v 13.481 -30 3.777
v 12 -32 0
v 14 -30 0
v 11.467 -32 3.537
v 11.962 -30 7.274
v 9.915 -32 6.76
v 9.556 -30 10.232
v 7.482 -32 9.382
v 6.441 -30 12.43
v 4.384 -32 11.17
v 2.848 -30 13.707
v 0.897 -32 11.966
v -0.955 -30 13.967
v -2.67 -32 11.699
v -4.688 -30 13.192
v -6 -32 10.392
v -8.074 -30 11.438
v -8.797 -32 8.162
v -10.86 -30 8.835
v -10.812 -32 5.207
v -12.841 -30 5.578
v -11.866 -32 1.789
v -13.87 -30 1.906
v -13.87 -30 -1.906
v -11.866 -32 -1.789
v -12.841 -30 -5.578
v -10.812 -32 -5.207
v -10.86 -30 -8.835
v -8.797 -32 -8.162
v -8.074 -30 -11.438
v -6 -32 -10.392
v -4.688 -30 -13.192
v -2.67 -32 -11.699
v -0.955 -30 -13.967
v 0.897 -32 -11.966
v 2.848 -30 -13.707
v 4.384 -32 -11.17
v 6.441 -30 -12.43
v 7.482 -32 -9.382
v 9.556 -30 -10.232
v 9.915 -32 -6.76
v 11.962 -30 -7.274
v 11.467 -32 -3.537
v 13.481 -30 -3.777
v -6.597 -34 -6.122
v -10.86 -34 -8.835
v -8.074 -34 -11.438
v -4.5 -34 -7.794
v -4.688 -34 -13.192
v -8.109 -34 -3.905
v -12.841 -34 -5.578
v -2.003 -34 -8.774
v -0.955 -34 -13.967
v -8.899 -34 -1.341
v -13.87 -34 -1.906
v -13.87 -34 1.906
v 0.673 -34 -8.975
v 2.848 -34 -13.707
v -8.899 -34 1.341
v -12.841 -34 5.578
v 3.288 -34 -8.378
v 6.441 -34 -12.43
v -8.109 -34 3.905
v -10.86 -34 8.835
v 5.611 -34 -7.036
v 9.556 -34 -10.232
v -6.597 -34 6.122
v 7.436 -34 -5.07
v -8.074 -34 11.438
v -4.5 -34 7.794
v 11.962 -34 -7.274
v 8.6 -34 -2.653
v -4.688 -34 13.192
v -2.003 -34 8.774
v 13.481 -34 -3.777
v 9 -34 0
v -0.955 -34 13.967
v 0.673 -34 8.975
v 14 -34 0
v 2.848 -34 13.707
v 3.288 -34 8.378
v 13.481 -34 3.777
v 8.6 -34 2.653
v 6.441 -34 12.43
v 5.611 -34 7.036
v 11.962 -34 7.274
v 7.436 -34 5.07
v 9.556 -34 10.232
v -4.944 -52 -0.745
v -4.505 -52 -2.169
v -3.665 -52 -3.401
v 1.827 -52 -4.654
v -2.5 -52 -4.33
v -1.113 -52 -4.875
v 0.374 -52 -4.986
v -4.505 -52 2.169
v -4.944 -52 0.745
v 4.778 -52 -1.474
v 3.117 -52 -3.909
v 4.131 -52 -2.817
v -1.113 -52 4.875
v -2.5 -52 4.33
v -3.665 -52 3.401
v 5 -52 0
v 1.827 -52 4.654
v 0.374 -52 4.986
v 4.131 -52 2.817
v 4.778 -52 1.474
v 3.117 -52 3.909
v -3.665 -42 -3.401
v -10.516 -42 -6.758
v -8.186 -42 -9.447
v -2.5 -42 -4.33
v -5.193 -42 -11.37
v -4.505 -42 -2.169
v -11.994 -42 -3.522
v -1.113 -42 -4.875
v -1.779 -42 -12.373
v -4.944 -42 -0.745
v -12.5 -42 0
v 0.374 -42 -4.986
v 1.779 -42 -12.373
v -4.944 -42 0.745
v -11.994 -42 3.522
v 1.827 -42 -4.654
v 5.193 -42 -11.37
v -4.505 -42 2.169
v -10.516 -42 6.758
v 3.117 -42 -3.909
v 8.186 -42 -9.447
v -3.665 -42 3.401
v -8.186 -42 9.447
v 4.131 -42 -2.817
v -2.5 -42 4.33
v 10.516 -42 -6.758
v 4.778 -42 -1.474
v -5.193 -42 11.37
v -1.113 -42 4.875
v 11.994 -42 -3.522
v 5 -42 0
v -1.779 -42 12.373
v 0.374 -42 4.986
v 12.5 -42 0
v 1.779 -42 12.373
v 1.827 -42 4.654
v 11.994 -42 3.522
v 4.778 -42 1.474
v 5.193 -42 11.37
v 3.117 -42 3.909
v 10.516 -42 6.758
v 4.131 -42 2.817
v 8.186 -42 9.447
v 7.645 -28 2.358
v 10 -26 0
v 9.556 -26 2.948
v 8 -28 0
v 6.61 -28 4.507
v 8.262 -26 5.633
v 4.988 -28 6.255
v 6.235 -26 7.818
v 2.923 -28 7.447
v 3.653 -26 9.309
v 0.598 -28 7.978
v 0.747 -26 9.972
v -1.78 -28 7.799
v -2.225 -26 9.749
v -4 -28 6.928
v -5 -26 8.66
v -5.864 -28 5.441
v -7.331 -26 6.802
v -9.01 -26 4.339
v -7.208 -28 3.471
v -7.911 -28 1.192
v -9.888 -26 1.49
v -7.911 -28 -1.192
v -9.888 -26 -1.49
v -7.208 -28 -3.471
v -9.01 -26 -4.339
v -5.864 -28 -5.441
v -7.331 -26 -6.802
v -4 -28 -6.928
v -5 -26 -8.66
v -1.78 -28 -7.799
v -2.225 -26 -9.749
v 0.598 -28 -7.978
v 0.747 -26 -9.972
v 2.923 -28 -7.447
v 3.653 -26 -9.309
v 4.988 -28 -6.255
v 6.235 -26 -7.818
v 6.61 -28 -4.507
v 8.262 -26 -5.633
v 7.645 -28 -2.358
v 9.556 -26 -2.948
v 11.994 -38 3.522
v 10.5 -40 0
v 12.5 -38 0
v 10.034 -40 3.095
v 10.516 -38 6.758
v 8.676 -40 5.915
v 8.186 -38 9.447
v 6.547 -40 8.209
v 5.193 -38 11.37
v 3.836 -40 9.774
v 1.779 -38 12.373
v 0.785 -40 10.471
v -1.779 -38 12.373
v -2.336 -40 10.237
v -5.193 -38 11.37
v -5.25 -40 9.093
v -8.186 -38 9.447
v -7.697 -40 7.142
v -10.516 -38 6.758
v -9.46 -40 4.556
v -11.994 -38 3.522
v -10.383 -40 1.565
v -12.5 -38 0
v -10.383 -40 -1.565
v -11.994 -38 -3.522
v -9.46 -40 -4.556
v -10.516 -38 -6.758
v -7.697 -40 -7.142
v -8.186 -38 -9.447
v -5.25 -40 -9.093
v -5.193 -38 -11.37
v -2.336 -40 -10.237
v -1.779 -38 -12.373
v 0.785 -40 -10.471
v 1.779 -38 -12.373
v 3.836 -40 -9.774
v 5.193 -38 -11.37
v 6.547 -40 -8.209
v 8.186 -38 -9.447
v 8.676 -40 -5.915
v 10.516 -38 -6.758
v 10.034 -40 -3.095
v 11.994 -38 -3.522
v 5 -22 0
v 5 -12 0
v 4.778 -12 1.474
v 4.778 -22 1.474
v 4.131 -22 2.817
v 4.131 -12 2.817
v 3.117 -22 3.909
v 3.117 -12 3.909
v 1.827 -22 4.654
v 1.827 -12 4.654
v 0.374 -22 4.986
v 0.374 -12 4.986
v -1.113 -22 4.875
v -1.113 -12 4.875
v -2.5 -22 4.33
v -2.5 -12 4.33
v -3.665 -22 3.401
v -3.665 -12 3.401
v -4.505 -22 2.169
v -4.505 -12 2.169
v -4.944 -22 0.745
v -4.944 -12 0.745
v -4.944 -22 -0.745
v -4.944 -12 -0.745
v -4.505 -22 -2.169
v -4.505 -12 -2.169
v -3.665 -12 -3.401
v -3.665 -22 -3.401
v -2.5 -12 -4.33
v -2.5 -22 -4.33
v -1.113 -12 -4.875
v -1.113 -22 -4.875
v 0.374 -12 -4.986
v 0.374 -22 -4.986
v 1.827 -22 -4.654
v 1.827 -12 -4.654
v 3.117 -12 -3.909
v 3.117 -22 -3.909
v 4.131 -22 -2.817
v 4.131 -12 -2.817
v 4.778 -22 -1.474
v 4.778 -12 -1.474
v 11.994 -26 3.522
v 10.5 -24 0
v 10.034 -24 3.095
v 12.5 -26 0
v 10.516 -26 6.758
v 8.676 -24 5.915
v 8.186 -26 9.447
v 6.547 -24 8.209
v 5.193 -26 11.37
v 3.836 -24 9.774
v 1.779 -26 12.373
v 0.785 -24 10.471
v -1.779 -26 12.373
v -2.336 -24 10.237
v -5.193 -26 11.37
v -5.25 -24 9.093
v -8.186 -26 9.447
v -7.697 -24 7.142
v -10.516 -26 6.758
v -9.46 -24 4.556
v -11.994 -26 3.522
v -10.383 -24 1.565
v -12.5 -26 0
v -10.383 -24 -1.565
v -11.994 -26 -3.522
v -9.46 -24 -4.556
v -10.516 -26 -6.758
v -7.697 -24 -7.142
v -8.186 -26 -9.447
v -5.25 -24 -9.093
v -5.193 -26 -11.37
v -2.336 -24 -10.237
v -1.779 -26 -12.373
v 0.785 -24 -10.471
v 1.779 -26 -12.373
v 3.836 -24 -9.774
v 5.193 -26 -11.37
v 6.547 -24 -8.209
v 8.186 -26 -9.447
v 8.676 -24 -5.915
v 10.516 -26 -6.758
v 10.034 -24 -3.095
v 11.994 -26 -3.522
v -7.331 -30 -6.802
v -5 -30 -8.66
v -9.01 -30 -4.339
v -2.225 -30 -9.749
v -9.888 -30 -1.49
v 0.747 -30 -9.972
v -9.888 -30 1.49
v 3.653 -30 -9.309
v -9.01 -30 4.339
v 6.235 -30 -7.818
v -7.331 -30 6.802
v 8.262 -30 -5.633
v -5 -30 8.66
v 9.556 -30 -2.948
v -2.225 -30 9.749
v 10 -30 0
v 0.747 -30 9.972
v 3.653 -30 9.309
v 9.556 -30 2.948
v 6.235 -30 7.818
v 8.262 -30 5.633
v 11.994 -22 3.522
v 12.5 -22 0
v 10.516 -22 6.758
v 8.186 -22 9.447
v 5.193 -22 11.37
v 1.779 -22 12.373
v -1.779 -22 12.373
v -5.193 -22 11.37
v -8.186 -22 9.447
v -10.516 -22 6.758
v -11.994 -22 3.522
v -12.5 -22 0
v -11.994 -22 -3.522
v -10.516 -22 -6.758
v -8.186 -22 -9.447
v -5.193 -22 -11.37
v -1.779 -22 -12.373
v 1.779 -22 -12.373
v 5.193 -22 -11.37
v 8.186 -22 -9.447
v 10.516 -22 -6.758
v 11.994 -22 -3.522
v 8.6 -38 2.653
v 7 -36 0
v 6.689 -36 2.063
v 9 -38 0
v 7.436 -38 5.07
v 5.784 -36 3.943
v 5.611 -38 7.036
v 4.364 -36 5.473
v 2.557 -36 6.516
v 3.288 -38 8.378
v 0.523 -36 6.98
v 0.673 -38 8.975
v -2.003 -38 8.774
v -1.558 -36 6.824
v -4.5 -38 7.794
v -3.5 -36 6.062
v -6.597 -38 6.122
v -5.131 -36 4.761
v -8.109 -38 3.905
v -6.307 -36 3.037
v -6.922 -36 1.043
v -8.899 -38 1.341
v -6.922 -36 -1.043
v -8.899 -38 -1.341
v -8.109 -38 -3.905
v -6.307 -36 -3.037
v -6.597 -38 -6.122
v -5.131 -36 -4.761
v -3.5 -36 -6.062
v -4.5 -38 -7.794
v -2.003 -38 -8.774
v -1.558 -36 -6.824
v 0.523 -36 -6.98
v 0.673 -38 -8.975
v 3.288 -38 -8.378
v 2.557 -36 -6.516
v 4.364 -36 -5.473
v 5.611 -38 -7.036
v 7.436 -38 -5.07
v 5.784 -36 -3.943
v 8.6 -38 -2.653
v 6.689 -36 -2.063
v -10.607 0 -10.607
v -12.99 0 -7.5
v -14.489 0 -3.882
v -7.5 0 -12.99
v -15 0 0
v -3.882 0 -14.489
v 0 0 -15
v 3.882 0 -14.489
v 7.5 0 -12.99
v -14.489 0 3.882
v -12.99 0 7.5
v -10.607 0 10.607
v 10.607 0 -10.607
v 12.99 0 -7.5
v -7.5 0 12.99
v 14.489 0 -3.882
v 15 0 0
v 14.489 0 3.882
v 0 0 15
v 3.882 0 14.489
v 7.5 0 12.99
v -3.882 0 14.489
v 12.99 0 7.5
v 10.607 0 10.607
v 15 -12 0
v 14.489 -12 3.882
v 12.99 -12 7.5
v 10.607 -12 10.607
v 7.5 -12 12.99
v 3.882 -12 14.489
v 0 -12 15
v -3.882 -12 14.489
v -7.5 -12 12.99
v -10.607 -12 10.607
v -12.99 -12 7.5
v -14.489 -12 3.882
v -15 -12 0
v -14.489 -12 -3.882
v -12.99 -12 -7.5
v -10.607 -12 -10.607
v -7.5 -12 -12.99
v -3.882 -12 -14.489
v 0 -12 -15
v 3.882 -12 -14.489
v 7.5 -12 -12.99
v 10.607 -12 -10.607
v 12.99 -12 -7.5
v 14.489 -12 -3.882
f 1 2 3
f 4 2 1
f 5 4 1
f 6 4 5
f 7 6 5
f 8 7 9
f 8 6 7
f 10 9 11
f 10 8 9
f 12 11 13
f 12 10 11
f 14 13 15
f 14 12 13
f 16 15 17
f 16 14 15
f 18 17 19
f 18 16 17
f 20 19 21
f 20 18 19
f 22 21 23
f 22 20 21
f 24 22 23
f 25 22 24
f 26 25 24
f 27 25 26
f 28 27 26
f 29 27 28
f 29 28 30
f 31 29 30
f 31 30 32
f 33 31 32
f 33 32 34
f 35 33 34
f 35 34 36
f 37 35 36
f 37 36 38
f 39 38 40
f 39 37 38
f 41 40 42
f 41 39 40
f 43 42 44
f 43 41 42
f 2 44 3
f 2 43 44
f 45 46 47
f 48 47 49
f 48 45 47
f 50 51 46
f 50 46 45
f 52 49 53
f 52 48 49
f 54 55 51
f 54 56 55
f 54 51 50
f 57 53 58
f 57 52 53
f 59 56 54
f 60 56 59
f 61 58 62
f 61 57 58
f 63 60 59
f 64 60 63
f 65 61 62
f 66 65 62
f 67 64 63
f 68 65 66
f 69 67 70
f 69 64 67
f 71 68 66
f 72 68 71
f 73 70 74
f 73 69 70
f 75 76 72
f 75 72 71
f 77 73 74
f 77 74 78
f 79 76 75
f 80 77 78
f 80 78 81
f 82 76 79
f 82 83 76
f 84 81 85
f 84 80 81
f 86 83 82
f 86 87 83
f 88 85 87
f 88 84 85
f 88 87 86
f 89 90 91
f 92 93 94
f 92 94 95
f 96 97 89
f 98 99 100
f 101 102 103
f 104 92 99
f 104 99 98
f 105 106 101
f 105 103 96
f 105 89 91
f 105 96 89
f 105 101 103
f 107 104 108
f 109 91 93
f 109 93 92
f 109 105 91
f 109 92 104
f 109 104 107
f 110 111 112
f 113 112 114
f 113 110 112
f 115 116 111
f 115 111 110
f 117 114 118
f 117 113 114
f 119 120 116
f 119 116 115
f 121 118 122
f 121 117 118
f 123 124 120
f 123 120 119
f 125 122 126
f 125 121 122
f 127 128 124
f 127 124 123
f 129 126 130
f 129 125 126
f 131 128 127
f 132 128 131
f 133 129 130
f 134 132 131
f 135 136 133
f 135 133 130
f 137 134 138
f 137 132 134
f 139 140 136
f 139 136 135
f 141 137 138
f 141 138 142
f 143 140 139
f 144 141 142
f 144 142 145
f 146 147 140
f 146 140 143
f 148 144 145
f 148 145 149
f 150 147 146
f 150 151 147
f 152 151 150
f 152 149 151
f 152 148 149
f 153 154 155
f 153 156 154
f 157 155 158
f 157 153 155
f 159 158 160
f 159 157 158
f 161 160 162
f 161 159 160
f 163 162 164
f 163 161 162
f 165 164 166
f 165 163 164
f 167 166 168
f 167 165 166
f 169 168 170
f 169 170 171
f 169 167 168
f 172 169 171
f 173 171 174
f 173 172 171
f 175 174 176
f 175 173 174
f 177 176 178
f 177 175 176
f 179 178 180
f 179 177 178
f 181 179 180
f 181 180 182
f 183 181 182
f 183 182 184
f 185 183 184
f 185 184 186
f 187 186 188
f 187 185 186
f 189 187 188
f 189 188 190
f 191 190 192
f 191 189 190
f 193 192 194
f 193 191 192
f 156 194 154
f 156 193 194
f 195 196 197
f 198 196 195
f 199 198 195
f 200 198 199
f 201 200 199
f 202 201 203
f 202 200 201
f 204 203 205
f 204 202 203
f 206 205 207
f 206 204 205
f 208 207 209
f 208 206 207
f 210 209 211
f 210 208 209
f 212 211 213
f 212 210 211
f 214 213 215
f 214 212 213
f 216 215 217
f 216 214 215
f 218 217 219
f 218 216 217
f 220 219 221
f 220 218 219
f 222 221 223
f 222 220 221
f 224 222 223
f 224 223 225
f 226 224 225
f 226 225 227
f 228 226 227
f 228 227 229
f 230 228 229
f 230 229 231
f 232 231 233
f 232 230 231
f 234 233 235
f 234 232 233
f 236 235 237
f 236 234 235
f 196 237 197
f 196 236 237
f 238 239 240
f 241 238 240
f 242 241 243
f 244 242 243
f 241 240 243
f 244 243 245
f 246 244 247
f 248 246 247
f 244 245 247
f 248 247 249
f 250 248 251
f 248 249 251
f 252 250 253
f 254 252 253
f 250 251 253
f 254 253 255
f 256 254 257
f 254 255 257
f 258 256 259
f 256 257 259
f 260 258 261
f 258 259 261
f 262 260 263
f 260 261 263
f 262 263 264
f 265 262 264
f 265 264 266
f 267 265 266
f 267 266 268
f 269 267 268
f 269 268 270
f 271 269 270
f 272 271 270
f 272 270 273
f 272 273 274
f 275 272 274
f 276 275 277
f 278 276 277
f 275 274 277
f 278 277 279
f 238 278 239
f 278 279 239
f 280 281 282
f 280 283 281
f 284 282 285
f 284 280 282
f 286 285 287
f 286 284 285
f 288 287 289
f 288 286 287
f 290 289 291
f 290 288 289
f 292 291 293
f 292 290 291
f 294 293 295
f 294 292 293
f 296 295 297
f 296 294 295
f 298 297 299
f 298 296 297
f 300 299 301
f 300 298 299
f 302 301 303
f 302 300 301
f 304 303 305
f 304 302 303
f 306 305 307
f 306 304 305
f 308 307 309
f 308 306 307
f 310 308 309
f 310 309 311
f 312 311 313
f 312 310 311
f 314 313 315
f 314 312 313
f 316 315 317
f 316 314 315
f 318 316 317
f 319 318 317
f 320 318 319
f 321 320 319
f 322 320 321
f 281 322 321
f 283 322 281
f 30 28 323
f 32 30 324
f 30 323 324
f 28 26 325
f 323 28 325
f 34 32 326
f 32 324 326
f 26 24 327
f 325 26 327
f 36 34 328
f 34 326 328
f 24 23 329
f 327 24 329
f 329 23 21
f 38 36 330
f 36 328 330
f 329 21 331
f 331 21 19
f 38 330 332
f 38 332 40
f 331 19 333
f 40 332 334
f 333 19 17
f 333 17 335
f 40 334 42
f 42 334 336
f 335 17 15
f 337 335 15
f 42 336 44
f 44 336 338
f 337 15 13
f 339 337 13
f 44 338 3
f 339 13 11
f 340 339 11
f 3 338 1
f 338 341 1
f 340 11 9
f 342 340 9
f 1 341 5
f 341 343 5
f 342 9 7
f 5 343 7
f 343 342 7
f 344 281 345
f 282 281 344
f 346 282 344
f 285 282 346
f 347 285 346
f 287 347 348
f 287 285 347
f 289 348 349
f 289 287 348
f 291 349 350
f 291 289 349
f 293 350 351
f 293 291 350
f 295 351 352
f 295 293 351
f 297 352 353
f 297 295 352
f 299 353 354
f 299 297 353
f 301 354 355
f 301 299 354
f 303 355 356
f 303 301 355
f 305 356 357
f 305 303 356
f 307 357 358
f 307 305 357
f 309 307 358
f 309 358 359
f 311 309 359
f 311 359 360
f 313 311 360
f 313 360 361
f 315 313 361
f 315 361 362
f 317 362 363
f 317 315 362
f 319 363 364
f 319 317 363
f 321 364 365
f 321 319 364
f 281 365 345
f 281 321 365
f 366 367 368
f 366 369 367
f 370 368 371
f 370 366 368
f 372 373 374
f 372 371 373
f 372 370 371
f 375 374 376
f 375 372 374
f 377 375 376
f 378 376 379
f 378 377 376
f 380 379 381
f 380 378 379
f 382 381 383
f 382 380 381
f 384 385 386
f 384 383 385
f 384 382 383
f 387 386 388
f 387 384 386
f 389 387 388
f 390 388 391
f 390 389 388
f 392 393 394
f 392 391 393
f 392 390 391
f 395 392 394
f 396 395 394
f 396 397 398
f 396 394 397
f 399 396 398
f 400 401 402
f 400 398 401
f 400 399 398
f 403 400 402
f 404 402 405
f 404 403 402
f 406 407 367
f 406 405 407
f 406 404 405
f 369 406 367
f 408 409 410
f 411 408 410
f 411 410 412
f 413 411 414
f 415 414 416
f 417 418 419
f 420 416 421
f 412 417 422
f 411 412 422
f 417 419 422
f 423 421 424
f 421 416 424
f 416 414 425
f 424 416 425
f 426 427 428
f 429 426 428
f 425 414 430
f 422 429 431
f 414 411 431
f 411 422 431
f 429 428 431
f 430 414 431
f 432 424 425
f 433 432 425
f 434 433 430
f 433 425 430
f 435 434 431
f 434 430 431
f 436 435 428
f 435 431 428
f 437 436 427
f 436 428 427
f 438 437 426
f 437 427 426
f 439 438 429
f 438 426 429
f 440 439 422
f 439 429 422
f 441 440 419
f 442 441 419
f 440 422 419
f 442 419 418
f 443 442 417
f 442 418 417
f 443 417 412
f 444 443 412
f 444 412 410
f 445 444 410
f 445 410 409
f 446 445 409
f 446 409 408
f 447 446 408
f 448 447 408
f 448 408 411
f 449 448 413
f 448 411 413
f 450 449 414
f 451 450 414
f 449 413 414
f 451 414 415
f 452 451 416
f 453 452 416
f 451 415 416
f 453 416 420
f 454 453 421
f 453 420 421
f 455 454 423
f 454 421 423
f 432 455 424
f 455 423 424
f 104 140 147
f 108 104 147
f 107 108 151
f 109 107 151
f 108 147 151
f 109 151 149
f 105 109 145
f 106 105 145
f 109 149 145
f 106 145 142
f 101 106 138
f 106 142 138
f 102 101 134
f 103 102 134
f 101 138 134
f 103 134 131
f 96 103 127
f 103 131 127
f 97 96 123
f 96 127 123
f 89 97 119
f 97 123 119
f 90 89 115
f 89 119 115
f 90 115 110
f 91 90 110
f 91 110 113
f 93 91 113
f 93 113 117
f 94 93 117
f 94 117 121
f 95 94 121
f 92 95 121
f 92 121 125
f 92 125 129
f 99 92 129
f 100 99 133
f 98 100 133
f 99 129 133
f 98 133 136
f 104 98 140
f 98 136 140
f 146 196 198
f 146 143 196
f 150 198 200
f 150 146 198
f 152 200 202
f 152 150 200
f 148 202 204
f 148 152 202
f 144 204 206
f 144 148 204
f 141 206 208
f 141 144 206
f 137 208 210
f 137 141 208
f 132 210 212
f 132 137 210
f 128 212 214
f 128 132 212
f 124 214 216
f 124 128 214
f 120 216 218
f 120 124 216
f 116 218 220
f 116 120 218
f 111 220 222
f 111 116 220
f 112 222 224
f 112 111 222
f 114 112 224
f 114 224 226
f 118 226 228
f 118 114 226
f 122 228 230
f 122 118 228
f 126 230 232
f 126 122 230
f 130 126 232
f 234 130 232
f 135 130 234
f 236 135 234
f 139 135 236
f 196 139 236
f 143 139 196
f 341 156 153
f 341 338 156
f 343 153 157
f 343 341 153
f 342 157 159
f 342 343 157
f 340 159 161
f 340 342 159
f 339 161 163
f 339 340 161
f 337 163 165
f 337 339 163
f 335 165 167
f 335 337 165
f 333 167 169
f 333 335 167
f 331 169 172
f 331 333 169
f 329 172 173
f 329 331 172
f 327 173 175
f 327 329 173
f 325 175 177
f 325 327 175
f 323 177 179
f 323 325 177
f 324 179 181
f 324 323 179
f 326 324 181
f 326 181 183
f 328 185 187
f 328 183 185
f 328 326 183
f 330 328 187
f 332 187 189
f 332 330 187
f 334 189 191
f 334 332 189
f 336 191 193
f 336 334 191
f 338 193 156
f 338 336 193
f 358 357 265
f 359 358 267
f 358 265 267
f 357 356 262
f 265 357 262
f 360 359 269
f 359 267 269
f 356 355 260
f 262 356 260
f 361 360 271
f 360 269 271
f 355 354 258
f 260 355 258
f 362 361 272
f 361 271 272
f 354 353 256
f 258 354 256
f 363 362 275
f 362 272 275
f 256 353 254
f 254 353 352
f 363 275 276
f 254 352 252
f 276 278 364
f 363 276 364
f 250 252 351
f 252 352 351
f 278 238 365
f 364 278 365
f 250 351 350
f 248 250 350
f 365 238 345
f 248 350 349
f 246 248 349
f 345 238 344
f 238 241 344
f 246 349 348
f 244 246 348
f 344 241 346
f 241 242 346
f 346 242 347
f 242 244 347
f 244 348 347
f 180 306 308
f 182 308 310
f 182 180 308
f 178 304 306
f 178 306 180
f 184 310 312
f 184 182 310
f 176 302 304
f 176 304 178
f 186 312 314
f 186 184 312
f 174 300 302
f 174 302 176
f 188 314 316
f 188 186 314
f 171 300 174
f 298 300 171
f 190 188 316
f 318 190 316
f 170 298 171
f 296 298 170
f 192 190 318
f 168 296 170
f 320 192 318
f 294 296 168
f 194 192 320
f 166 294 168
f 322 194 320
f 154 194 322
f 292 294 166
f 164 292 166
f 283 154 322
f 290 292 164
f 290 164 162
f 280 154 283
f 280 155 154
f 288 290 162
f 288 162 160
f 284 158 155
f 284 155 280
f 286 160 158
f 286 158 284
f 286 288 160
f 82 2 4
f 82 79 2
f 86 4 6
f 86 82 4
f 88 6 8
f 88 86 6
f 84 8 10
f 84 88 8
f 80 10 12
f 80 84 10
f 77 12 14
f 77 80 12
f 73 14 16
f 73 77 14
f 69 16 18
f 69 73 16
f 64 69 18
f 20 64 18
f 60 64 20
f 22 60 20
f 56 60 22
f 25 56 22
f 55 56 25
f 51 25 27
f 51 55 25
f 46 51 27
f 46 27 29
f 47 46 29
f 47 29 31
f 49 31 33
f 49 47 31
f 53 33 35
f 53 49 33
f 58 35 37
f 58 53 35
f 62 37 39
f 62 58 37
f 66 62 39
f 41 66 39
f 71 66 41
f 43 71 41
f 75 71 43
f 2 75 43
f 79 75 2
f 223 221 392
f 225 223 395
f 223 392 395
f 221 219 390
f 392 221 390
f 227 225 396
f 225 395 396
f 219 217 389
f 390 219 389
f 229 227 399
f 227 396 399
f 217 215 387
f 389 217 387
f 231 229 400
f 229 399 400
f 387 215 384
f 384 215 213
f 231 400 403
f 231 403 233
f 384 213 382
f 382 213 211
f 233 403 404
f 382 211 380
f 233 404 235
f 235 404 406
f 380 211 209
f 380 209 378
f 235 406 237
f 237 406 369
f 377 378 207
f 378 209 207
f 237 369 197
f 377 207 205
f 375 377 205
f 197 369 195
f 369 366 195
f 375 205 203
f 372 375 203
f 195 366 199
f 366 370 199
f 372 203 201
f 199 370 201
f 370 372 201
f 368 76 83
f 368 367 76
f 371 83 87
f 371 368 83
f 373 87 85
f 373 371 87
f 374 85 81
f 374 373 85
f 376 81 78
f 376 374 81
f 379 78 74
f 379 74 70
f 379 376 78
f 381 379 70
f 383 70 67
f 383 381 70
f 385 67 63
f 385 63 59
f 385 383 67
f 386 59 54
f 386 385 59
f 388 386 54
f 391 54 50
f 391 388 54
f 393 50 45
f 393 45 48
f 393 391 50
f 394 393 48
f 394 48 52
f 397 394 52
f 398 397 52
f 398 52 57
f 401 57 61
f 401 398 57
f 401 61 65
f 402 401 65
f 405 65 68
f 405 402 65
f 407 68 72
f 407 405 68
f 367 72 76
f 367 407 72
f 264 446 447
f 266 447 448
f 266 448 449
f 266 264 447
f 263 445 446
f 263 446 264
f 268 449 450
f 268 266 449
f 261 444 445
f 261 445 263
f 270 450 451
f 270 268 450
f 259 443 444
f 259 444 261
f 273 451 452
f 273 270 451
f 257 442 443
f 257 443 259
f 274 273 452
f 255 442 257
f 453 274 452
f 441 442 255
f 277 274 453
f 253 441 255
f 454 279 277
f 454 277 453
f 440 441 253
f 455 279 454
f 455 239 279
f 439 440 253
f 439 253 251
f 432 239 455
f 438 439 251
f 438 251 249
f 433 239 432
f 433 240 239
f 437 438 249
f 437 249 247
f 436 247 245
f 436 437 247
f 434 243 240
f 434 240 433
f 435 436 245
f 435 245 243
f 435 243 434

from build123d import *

# Parameters (mm, degrees)
F0_R      = 15
F1_DEPTH  = 12
F2_R      = 5
F3_DEPTH  = 10
F4_R      = 12.5
F5_DEPTH  = 2
F5_TAPER  = 45
F6_R      = 10.5
F7_DEPTH  = 2
F7_TAPER  = -45
F8_R      = 10
F9_DEPTH  = 2
F9_TAPER  = 45
F10_R     = 8
F11_DEPTH = 2
F11_TAPER = -45
F12_R     = 14
F13_DEPTH = 2
F13_TAPER = 45
F14_R     = 12
F15_DEPTH = 2
F15_TAPER = -45
F16_R     = 9
F17_DEPTH = 2
F17_TAPER = 45
F18_R     = 7
F19_DEPTH = 2
F19_TAPER = -45
F20_R     = 12.5
F21_DEPTH = 2
F21_TAPER = 45
F22_R     = 10.5
F23_DEPTH = 2
F23_TAPER = -45
F24_R     = 5
F25_DEPTH = 10


with BuildPart() as f1:
    # F0 (on Front) → F1 (new body)
    with BuildSketch(Plane.XZ):
        Circle(F0_R)
    extrude(amount=F1_DEPTH)

    # F2 (on face) → F3 (join)
    with BuildSketch(Plane.XZ.offset(12)):
        Circle(F2_R)
    extrude(amount=F3_DEPTH)

    # F4 (on face) → F5 (join)
    with BuildSketch(Plane.XZ.offset(22)):
        Circle(F4_R)
    extrude(amount=F5_DEPTH, taper=F5_TAPER)

    # F6 (on face) → F7 (join)
    with BuildSketch(Plane.XZ.offset(24)):
        Circle(F6_R)
    extrude(amount=F7_DEPTH, taper=F7_TAPER)

    # F8 (on face) → F9 (join)
    with BuildSketch(Plane.XZ.offset(26)):
        Circle(F8_R)
    extrude(amount=F9_DEPTH, taper=F9_TAPER)

    # F10 (on face) → F11 (join)
    with BuildSketch(Plane.XZ.offset(28)):
        Circle(F10_R)
    extrude(amount=F11_DEPTH, taper=F11_TAPER)

    # F12 (on face) → F13 (join)
    with BuildSketch(Plane.XZ.offset(30)):
        Circle(F12_R)
    extrude(amount=F13_DEPTH, taper=F13_TAPER)

    # F14 (on face) → F15 (join)
    with BuildSketch(Plane.XZ.offset(32)):
        Circle(F14_R)
    extrude(amount=F15_DEPTH, taper=F15_TAPER)

    # F16 (on face) → F17 (join)
    with BuildSketch(Plane.XZ.offset(34)):
        Circle(F16_R)
    extrude(amount=F17_DEPTH, taper=F17_TAPER)

    # F18 (on face) → F19 (join)
    with BuildSketch(Plane.XZ.offset(36)):
        Circle(F18_R)
    extrude(amount=F19_DEPTH, taper=F19_TAPER)

    # F20 (on face) → F21 (join)
    with BuildSketch(Plane.XZ.offset(38)):
        Circle(F20_R)
    extrude(amount=F21_DEPTH, taper=F21_TAPER)

    # F22 (on face) → F23 (join)
    with BuildSketch(Plane.XZ.offset(40)):
        Circle(F22_R)
    extrude(amount=F23_DEPTH, taper=F23_TAPER)

    # F24 (on face) → F25 (join)
    with BuildSketch(Plane.XZ.offset(42)):
        Circle(F24_R)
    extrude(amount=F25_DEPTH)


solid = f1.part
